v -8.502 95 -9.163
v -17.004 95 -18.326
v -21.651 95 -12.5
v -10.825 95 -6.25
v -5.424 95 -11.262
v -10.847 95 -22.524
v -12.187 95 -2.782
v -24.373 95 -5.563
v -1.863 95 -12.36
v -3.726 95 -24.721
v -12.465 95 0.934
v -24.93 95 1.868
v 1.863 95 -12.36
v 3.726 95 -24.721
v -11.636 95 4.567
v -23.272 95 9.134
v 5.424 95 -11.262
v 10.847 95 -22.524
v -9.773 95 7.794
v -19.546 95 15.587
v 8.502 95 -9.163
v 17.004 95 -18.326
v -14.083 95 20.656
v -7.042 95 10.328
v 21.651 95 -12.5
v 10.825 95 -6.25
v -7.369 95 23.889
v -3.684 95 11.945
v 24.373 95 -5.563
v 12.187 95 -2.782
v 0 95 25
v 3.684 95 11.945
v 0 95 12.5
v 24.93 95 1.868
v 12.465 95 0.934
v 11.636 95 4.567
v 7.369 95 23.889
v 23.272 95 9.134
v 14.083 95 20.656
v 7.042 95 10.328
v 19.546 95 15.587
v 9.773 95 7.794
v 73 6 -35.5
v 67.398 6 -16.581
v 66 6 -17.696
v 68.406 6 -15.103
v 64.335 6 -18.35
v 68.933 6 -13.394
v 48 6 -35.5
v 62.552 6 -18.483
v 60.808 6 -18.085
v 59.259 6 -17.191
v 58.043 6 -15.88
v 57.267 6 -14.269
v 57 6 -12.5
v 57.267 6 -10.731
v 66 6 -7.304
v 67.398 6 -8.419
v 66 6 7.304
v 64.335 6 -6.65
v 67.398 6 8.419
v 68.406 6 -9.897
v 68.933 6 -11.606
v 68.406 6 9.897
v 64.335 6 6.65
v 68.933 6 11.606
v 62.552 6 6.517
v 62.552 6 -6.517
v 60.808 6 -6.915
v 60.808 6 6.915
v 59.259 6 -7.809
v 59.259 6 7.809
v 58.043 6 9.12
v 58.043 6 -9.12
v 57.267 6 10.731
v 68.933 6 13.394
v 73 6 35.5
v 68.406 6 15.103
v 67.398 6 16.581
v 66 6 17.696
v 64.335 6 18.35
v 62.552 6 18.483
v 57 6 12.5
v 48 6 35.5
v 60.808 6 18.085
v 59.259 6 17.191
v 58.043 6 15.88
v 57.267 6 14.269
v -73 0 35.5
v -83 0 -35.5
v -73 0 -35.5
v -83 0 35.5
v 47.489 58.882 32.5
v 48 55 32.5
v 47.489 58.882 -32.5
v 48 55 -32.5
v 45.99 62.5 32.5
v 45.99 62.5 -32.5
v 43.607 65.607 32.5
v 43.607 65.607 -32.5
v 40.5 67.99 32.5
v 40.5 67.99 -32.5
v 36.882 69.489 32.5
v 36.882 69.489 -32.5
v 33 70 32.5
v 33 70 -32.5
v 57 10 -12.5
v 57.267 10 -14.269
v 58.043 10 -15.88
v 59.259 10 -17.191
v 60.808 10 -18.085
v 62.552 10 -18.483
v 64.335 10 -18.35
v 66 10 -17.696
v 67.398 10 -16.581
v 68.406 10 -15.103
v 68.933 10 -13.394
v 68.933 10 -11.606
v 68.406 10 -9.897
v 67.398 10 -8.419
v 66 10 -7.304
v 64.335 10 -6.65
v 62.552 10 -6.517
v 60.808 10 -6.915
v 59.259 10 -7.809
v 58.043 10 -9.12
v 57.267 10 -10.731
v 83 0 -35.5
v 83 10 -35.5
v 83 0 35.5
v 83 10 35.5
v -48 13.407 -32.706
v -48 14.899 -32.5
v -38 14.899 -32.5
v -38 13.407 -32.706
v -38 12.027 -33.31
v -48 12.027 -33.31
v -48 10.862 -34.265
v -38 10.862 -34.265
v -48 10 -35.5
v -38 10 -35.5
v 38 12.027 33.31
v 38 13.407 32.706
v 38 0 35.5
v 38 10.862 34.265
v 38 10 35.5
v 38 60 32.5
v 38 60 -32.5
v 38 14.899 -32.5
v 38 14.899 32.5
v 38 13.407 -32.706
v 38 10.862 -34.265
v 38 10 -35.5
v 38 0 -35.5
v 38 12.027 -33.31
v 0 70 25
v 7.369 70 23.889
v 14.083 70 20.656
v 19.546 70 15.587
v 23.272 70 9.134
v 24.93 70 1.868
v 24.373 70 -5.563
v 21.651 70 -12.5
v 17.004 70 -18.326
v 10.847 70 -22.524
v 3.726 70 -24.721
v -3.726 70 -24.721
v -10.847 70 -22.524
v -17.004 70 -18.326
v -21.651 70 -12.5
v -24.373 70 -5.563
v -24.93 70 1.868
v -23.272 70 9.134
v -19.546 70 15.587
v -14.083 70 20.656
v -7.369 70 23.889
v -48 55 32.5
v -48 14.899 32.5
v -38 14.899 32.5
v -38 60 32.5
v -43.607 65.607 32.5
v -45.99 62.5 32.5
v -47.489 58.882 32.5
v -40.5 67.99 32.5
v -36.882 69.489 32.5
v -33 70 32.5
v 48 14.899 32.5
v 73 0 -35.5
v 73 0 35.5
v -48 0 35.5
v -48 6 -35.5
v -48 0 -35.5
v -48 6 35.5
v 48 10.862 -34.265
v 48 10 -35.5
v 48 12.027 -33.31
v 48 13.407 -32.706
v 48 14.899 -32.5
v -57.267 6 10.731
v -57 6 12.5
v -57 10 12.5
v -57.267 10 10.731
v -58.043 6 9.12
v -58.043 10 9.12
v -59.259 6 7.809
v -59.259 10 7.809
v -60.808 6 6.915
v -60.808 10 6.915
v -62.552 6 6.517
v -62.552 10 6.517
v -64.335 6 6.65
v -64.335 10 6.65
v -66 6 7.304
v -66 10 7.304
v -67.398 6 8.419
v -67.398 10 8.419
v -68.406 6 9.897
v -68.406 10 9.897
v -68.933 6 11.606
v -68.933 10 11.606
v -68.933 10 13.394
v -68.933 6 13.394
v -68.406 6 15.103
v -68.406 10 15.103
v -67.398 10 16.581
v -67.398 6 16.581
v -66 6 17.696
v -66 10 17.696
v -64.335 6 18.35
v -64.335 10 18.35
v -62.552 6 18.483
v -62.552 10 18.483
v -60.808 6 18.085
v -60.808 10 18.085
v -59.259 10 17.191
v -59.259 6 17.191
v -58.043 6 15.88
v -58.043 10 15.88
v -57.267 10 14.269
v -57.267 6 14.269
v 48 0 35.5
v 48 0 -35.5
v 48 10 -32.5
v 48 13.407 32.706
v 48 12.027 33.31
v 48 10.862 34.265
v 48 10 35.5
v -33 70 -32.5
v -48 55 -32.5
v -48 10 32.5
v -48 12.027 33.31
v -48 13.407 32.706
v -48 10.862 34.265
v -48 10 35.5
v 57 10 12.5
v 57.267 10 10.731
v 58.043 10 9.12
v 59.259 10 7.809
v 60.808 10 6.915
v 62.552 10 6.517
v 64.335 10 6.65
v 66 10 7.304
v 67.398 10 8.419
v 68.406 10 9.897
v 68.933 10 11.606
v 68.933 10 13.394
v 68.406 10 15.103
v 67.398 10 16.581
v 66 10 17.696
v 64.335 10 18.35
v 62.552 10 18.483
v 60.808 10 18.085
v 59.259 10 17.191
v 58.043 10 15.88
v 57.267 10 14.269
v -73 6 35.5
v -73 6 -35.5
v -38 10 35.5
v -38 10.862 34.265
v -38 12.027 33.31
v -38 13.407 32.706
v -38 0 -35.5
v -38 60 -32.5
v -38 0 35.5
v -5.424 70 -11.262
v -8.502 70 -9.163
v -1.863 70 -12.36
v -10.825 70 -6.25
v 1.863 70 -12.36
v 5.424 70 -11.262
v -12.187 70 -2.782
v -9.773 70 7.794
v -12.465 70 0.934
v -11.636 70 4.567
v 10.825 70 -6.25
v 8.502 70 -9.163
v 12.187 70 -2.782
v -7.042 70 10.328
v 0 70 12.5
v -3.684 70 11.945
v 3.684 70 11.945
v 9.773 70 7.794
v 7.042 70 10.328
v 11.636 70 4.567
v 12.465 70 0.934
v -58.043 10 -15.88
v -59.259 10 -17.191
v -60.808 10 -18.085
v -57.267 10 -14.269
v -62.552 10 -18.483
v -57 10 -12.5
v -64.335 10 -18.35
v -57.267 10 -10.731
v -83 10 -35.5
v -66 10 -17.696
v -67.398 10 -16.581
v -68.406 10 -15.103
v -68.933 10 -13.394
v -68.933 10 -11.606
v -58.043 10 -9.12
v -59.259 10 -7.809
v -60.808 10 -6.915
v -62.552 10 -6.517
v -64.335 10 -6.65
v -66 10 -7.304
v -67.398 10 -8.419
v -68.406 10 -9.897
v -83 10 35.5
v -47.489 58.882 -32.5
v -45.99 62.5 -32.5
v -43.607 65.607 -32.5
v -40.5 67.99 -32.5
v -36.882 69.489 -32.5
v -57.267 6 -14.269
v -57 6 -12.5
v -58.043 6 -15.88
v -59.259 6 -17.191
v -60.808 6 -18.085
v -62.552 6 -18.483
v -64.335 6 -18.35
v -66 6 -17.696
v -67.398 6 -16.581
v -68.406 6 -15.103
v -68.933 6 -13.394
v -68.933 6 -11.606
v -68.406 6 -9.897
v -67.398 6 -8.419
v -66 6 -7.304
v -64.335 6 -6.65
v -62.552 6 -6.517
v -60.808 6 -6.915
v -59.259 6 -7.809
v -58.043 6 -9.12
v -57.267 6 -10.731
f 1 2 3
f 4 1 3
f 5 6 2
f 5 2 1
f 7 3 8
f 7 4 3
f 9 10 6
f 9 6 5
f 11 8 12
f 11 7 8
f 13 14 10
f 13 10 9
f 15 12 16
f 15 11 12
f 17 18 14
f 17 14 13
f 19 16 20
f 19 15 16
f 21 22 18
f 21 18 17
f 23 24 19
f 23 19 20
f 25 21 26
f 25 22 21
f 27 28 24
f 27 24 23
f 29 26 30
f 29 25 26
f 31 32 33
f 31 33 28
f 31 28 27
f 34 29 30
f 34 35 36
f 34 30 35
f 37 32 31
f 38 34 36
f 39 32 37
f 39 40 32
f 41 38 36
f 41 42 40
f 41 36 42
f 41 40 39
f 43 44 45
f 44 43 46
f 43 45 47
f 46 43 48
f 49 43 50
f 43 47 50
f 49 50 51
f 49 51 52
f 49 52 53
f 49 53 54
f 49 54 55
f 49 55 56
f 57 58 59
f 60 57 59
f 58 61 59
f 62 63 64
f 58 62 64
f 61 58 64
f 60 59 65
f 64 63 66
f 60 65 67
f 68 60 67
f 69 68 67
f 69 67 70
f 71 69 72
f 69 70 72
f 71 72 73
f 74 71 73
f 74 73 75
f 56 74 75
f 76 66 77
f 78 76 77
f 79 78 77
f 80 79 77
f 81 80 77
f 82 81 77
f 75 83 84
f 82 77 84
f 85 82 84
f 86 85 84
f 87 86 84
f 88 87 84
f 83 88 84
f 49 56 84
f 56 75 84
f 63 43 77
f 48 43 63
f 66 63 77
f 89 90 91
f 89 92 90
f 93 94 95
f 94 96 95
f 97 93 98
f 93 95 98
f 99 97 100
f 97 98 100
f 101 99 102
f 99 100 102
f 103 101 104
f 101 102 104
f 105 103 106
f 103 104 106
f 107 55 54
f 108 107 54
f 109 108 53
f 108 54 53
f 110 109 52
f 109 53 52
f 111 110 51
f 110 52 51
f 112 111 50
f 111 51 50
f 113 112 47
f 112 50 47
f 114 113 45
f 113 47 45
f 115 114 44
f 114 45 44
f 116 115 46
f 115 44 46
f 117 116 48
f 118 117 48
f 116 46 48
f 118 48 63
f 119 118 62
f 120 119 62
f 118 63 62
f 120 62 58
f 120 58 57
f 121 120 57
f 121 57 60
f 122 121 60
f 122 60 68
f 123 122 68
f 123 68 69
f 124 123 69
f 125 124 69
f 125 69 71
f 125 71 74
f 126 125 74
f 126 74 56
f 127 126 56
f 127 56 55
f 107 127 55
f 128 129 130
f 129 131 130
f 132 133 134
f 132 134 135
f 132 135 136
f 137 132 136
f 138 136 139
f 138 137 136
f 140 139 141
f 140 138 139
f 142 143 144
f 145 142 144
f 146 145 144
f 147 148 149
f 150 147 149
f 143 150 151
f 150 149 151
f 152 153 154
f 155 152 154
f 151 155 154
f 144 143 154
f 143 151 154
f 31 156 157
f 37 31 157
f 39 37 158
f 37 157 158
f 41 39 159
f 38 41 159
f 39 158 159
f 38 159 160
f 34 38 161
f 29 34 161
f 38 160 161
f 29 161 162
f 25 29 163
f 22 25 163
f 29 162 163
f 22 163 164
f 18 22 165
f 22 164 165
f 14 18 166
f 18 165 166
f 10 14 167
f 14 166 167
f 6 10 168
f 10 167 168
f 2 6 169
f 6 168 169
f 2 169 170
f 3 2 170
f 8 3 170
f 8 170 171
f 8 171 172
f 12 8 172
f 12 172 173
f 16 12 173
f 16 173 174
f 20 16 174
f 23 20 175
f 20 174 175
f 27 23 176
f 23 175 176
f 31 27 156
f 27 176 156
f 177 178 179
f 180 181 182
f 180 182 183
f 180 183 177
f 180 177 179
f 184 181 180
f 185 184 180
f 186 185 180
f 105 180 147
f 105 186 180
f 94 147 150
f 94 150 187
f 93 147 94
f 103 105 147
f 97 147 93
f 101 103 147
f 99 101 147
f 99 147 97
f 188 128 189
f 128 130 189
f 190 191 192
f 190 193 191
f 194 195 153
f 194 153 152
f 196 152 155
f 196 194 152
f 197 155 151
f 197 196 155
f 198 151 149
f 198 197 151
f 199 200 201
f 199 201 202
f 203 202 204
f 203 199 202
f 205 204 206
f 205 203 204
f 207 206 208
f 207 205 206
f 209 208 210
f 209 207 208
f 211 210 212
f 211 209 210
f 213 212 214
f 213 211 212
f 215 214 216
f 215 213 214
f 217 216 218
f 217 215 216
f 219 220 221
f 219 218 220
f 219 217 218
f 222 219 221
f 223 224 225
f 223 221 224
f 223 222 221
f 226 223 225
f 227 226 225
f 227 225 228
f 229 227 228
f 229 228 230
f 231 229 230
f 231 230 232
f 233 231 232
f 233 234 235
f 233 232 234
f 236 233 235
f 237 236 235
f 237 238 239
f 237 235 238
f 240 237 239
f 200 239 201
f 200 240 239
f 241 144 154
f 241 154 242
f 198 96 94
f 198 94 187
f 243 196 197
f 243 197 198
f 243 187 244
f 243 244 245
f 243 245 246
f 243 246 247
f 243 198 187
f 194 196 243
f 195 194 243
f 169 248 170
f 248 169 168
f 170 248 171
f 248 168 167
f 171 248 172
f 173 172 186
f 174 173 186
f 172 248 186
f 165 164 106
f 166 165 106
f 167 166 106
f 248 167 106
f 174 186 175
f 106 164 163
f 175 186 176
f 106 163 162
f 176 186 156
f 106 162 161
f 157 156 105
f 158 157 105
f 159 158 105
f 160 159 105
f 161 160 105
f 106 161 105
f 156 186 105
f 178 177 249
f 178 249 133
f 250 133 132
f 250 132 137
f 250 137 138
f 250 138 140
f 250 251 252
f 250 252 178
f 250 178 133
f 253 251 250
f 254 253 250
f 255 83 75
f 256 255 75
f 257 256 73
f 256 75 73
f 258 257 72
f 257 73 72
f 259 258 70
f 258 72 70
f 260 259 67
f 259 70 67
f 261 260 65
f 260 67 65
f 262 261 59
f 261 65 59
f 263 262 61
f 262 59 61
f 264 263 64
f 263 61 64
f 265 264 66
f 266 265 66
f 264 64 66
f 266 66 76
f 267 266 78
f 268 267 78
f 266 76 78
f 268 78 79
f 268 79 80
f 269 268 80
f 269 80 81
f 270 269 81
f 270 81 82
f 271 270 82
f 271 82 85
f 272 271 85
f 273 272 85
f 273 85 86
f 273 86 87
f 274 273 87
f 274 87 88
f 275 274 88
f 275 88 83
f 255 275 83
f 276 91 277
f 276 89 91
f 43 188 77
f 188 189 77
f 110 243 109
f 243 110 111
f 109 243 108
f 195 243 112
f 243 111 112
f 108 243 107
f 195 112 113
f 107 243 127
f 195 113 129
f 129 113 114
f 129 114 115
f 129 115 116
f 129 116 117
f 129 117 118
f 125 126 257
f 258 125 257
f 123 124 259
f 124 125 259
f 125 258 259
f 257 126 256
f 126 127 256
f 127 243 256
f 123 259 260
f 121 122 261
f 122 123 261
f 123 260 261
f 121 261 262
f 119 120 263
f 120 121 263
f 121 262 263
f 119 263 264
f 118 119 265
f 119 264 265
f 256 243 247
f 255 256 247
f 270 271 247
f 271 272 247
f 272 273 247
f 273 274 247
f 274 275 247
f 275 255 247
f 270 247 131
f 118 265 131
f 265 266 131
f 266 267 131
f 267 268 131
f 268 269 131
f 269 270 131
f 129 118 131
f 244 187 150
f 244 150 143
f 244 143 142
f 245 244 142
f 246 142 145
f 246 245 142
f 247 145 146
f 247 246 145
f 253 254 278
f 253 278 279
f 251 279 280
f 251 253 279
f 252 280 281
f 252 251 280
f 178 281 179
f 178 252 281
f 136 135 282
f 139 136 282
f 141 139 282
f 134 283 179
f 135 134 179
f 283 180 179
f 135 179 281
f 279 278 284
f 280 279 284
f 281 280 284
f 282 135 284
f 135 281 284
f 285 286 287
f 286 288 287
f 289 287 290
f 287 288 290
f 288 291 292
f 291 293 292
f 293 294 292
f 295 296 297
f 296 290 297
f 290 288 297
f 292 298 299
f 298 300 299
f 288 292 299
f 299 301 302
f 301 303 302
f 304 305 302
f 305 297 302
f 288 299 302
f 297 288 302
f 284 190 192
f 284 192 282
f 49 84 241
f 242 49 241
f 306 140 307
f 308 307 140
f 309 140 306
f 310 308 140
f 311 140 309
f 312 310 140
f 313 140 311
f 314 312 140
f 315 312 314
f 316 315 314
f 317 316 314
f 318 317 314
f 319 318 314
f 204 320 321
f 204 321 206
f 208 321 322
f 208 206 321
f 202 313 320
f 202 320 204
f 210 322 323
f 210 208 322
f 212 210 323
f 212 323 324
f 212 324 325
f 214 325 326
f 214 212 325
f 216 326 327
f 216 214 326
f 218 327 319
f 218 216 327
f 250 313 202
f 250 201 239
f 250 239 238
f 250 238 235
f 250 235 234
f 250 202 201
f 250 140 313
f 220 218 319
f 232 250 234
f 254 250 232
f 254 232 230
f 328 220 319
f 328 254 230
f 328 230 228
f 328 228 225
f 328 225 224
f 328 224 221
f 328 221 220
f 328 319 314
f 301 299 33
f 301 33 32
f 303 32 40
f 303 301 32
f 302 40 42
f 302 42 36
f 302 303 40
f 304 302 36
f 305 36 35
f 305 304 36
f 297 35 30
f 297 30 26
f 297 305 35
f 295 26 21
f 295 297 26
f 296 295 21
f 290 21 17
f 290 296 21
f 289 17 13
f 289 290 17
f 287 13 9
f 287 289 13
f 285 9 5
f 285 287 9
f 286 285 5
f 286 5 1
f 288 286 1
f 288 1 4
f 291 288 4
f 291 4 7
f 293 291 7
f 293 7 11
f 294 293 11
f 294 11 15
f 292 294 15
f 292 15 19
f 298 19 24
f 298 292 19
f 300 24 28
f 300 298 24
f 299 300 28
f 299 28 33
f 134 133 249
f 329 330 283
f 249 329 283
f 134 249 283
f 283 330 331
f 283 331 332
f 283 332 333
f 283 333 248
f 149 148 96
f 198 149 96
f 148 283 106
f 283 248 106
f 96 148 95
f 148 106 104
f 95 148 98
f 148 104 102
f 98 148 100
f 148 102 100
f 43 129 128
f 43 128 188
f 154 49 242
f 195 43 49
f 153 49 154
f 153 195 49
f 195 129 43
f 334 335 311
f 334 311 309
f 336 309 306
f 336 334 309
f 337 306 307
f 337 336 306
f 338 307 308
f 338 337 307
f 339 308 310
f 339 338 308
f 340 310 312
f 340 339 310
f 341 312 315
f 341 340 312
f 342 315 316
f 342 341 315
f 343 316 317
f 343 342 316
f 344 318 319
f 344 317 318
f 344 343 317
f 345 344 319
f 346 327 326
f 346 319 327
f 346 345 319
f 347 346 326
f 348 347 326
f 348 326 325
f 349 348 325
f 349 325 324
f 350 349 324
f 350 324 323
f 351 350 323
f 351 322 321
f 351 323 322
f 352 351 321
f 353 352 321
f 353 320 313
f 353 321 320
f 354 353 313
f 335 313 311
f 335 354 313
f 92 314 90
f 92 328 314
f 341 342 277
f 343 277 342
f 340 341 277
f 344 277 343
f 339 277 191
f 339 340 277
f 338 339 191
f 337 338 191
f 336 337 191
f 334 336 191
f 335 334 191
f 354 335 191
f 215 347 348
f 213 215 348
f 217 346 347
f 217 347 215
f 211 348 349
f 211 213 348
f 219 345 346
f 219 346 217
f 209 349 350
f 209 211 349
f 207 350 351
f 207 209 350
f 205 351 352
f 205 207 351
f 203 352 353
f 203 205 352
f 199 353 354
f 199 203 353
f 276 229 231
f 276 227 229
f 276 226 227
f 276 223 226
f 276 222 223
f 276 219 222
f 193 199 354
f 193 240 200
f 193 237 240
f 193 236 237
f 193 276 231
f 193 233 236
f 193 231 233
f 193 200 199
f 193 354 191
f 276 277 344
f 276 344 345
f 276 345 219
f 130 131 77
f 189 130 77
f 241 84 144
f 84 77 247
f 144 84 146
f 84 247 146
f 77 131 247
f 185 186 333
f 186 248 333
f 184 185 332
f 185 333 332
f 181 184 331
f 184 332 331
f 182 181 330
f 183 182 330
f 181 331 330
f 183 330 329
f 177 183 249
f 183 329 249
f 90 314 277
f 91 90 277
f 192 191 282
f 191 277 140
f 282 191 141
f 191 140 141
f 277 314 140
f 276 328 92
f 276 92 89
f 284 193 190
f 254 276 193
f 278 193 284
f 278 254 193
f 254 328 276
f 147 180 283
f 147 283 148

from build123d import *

# Parameters (mm, degrees)
SKETCH1_W           = 96
SKETCH1_H           = 70
BOSS_EXTRUDE1_DEPTH = 32.5
BOSS_EXTRUDE2_DEPTH = 35.5
SKETCH3_W           = 76
SKETCH3_H           = 60
CUT_EXTRUDE1_DEPTH  = 129.113231167
FILLET1_R           = 15
FILLET2_R           = 5.5
SKETCH4_R           = 25
SKETCH4_R_2         = 12.5
BOSS_EXTRUDE3_DEPTH = 25
HOLE1_D             = 12


with BuildPart() as part:
    # Sketch1 → Boss-Extrude1 (new, symmetric)
    with BuildSketch(Plane.XY):
        with Locations((0, 35)):
            Rectangle(SKETCH1_W, SKETCH1_H)
    extrude(amount=BOSS_EXTRUDE1_DEPTH, both=True)

    # Sketch2 → Boss-Extrude2 (add, symmetric)
    with BuildSketch(Plane.XY):
        Polygon((38, 0), (38, 10), (83, 10), (83, 0), (73, 0), (73, 6), (48, 6), (48, 0), align=None)
    boss_extrude2 = extrude(amount=BOSS_EXTRUDE2_DEPTH, both=True)

    # Mirror1: Boss-Extrude2 across plane
    add(boss_extrude2.mirror(Plane(origin=(0, 0, 0), x_dir=(0, 0, 1), z_dir=(1, 0, 0))))

    # Sketch3 → Cut-Extrude1 (cut, through all)
    with BuildSketch(Plane.XY.offset(32.5)):
        with Locations((0, 30)):
            Rectangle(SKETCH3_W, SKETCH3_H)
    extrude(amount=-CUT_EXTRUDE1_DEPTH, mode=Mode.SUBTRACT)

    # Fillet1
    fillet1_edges = [part.edges().sort_by_distance(p)[0] for p in [
        (-48, 70, 0),
        (48, 70, 0),
    ]]
    fillet(fillet1_edges, radius=FILLET1_R)

    # Fillet2
    # the kernel refuses this fillet: 5.5 mm, written as the material it adds along each edge
    with BuildSketch(Plane(origin=(-48, 10, -32.5), x_dir=(0, 1, 0), z_dir=(1, 0, 0)), Plane(origin=(48, 10, 32.5), x_dir=(0, 1, 0), z_dir=(-1, 0, 0))) as fillet2_piece_1:
        with BuildLine():
            CenterArc((4.898979486, -5.5), FILLET2_R, 90, 62.964308211)
            Line((0, -3), (-0.09797959, -2.95))
            ThreePointArc((-0.09797959, -2.95), (-0.11, -1.5), (-0.11, 0))
            Line((-0.11, 0), (0, 0.11))
            Line((0, 0.11), (4.898979486, 0.11))
            Line((4.898979486, 0.11), (4.898979486, 0))
        make_face()
    extrude(amount=10)
    with BuildSketch(Plane(origin=(48, 10, -32.5), x_dir=(0, 1, 0), z_dir=(-1, 0, 0)), Plane(origin=(-48, 10, 32.5), x_dir=(0, 1, 0), z_dir=(1, 0, 0))) as fillet2_piece_2:
        with BuildLine():
            CenterArc((4.898979486, 5.5), FILLET2_R, 207.035691789, 62.964308211)
            Line((0, 3), (-0.09797959, 2.95))
            ThreePointArc((-0.09797959, 2.95), (-0.11, 1.5), (-0.11, 0))
            Line((-0.11, 0), (0, -0.11))
            Line((0, -0.11), (4.898979486, -0.11))
            Line((4.898979486, -0.11), (4.898979486, 0))
        make_face()
    extrude(amount=10)

    # Sketch4 → Boss-Extrude3 (add)
    with BuildSketch(Plane(origin=(0, 70, 0), x_dir=(1, 0, 0), z_dir=(0, 1, 0))):
        with Locations(Location((0, 0, 0), (0, 0, 270))):
            Circle(SKETCH4_R)
        with Locations(Location((0, 0, 0), (0, 0, 270))):
            Circle(SKETCH4_R_2, mode=Mode.SUBTRACT)
    extrude(amount=BOSS_EXTRUDE3_DEPTH)

    # Hole1 (through all)
    with Locations(Plane(origin=(0, 10, 0), x_dir=(1, 0, 0), z_dir=(0, 1, 0))):
        with Locations((63, 12.5), (63, -12.5)):
            hole1 = Hole(HOLE1_D / 2)

    # Mirror2: Hole1 across plane
    add(hole1.mirror(Plane(origin=(0, 0, 0), x_dir=(0, 0, 1), z_dir=(1, 0, 0))), mode=Mode.SUBTRACT)


solid = part.part
